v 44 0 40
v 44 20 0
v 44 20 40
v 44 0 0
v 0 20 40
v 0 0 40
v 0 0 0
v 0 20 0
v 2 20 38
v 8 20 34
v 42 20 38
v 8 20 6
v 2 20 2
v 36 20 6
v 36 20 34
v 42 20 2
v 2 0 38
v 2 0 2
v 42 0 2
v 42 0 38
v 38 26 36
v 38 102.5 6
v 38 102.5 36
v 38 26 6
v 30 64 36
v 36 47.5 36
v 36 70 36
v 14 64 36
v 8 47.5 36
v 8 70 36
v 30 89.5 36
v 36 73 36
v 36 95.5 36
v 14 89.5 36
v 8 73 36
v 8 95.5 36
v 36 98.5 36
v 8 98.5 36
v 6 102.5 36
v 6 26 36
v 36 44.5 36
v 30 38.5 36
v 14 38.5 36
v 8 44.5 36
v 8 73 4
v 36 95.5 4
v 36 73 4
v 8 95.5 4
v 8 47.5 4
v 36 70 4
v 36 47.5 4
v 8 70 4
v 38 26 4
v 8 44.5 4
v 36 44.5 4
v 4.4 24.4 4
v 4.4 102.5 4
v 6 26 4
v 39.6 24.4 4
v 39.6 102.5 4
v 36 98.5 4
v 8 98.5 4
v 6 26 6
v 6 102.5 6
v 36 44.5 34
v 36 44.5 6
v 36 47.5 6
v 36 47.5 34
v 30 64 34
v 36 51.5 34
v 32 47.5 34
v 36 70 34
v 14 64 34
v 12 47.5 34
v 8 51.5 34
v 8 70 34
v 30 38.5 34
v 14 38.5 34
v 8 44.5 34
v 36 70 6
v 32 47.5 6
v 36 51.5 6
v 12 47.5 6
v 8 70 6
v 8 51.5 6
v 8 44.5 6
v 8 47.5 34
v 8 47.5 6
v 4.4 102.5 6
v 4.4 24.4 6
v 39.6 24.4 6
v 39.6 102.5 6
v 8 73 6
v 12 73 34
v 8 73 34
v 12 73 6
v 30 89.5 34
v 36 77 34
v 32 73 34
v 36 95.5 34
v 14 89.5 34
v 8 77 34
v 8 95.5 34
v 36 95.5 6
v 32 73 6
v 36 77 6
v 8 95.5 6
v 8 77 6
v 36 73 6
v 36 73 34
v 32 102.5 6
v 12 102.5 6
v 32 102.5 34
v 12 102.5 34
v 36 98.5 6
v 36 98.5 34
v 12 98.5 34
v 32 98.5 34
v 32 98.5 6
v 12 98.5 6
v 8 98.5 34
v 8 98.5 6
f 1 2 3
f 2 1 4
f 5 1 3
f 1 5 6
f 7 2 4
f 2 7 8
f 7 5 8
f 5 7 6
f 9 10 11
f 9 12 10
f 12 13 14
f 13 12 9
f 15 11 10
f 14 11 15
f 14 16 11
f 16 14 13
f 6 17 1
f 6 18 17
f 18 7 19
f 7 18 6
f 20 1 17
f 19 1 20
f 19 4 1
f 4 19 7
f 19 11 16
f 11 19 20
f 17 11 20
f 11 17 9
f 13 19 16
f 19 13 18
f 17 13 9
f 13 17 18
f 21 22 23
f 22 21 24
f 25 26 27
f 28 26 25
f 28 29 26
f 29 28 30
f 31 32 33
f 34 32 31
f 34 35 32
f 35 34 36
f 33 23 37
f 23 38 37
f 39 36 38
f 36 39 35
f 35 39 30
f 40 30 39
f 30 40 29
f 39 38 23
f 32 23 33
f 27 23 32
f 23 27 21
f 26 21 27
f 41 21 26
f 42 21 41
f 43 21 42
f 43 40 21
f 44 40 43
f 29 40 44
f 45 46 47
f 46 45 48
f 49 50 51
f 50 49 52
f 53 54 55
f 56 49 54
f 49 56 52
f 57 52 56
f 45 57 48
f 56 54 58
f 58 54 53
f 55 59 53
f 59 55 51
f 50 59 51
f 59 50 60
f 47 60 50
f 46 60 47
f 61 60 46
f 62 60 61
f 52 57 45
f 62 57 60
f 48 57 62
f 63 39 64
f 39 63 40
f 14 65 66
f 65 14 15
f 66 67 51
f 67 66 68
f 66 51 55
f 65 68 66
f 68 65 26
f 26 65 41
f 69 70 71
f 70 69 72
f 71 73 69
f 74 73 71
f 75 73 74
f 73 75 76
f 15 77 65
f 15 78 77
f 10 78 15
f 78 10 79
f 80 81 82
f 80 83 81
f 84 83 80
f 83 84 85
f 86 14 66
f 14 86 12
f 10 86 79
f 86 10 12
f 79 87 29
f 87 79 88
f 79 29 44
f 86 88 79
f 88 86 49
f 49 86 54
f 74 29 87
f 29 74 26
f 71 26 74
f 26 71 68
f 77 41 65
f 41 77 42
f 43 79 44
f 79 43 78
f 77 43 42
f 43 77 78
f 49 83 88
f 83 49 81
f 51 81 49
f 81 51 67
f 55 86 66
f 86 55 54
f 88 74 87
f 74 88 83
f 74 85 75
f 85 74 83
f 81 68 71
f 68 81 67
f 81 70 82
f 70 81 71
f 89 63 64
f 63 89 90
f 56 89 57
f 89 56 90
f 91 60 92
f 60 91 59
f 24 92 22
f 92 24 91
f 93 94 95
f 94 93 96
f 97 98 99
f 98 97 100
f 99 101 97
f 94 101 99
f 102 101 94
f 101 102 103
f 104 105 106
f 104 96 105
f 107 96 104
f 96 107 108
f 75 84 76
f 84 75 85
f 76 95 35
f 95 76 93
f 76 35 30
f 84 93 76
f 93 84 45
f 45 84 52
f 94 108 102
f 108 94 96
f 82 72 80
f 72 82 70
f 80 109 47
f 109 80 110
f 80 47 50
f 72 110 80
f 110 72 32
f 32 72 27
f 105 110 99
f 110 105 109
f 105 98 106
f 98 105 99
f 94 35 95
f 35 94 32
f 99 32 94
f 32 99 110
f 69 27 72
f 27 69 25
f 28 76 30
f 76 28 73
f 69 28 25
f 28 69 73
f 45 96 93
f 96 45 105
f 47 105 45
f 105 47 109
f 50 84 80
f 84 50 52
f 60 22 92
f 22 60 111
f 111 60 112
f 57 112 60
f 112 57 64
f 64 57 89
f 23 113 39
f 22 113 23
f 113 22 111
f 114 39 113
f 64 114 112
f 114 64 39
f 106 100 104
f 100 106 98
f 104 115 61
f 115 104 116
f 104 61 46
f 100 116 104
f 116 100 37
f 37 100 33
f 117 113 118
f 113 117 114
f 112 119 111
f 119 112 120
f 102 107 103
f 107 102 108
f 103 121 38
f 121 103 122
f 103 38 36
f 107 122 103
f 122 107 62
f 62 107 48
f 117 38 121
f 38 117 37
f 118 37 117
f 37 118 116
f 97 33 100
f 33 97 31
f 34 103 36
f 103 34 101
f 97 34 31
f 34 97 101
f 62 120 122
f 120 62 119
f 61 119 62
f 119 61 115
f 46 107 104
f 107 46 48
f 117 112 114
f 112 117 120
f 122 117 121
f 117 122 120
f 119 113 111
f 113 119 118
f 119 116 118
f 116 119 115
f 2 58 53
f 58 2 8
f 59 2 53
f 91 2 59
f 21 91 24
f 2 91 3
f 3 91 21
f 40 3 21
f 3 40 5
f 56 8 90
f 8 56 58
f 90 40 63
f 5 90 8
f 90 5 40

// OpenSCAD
 //Variables
// Select which part you want to create: corpus is the main part of the pollenstripper, corpus_brush is a version of the pollenstripper with angled mounts for brushes, the darkener is a part that sits on top of the plexiglas cube to keep light from getting in and the funnel was meant to collect the pollen after it fell off and through the grid (deprecated)
cube_design = "corpus"; // [corpus, corpus_dual_cube, corpus_brush, darkener, funnel]

/* [Acrylic Cube] */
plexi_cube_width = 39; //39 for cube1, 32 for cube2
plexi_cube_length = 35; //35 for cube1, 30 for cube2
plexi_cube_depth_overall = 30;
plexi_cube_depth = 20; //this is for the main corpus
plexi_cube_thickness = 2;
plexi_cube_buffer = 0.5; //1mm room in every direction

/* [Acrylic Cube 2: Only necessary for dual cube corpus] */
plexi_cube_width2 = 39; //39 for cube1, 32 for cube2
plexi_cube_length2 = 35; //35 for cube1, 30 for cube2
plexi_cube_depth_overall2 = 30;
plexi_cube_depth2 = 20; //this is for the main corpus
plexi_cube_thickness2 = 2;
plexi_cube_buffer2 = 0.5; //1mm room in every direction

/* [Darkener] */
// The length that the darkener overlaps with the corpus
darkener_overhang = 10;

/* [Insert] */
//needs to be the same as in the insert creator
insert_bar_height = 6;
//needs to be the same as in the insert creator
insert_bar_length = 16;
//needs to be the same as "base plate length upper" in the insert creator
insert_base_length = 28;
//needs to be the same as "base plate thickness" in the insert creator
insert_thickness = 2;
// buffer space between corpus and insert
insert_buffer = 1;
// distance of the insert from the end of the tube. CAREFUL: changing this can break the design, default=4
insert_distance_from_tube_end = 4;

/* [Corpus Basics] */
//thickness of the tubes (lower parts of the corpus containing the inserts)
tube_thickness = 2;
//width of the tubes
tube_width = 28;
//length of the tubes
tube_length = 28;
//depth of the tubes, 25.5 for normal corpus design, 32 for brush
tube_depth = 25.5; // was 38.5, for normal design 25.5, increase for brush to 32
//number of tubes
tube_count = 3;

// width of the bar that locks the inserts so that they can't move to the back, CAREFUL: changing this will break the design, default = 4
security_bar_width = 4;
slide_bar_length = tube_depth+2;
// width of the bar the funnel slides on
slide_bar_width = 1.6; //decreased from 2 to 1,6 for buffer
//height of the bar the funnel slides on
slide_bar_height = 2;

/* [Grid Pattern] */
// grid pattern, meant to let the stripped pollen fall through into the funnel
grid_pattern = "None"; //[None, squares, squares2]
//width of the squares
square_width = 5;
//length of the squares
square_length = 4;
//distance between the squares
square_distance = 2;
//number oif squares per row
number_squares_per_row = 4;
//number of squares per column, suggestion for normal corpus 2, for brush 3
number_squares_per_column = 3;

/* [Brush] */
// length of the top part of the brush
brush_head_length = 16;
// length of the bottom part of the brush
brush_bottom_length = 24;
// width of the brush
brush_width = 19.25;
// thickness of the brush
brush_thickness = 5.5;
// distance of the screw holes from the top of the brush
distance_hole_from_top = 1.6;
// distance of the screw holes from the side of the brush
distance_hole_from_side = 2.6;
// diameter of the screw holes
diameter = 3;

/* [Funnel] */
// width of the bars that slide on the corpus
funnel_slide_width = 4;
// height of the bars that slide on the corpus
funnel_slide_height = 7;
// height of the hollow part of the bars that slide on the corpus
funnel_slide_hollow_height = 3;
// buffer between the corpus bar and the funnel slide bar
funnel_slide_buffer_width = 0.2;
// length of the pyramid
funnel_pyramid_length = 32;
// height of the tip of the pyramid part
funnel_pyramid_tip_height = 18;
// width of the cube at the top of the funnel
funnel_tip_cube_width = 14;
// length of the cube at the top of the funnel
funnel_tip_cube_length = 14;
// height of the cube at the top of the funnel
funnel_tip_cube_height = 11;
// height of the cylinder that hollows out the top of the funnel
funnel_hollow_cylinder_height = 20;
// diameter of the cylinder that hollows out the top of the funnel
funnel_hollow_cylinder_diameter = 7;



/* [Misc] */
// Number of Faces: higher number is good for smoother curved areas, lower number significantly decreases rendering time, recommending 25 for playing around and 100 for exporting
$fn = 50;

//angle
tube_distance_left = (plexi_cube_width/2+plexi_cube_buffer+plexi_cube_thickness-tube_width/2-tube_thickness);
tube_distance_bottom = (plexi_cube_length/2+plexi_cube_buffer+plexi_cube_thickness-tube_length/2-tube_thickness);
angle_depth = max(tube_distance_left, tube_distance_bottom);
outer_cube_width = plexi_cube_width + 2*plexi_cube_thickness + 2*plexi_cube_buffer;
outer_cube_length = plexi_cube_length + 2*plexi_cube_thickness + 2*plexi_cube_buffer;

//angle2
tube_distance_left2 = (plexi_cube_width2/2+plexi_cube_buffer2+plexi_cube_thickness2-tube_width/2-tube_thickness);
tube_distance_bottom2 = (plexi_cube_length2/2+plexi_cube_buffer2+plexi_cube_thickness2-tube_length/2-tube_thickness);
angle_depth2 = max(tube_distance_left2, tube_distance_bottom2);
outer_cube_width2 = plexi_cube_width2 + 2*plexi_cube_thickness2 + 2*plexi_cube_buffer2;
outer_cube_length2 = plexi_cube_length2 + 2*plexi_cube_thickness2 + 2*plexi_cube_buffer2;

//module to create triangles
module triangle(width,length,height){
    difference(){
        cube([width,length,height]);
        rotate([0,0,45]) cube([width*2.5,length*2.5,height*5]);
    }
}

//module to show points of a polyhedron
module showPoints(v) {
    for (i = [0: len(v)-1]) {
        translate(v[i]) color("red") 
        text(str(i), font = "Courier New", size=1.5);
         
    }
}

//module to create a square grid pattern
module square_grid(){
    grid_width = square_width*number_squares_per_row + square_distance*(number_squares_per_row-1);
    grid_length = square_length*number_squares_per_column + square_distance*(number_squares_per_column-1);
translate([tube_width/2+tube_thickness-grid_width/2,tube_depth+angle_depth-(insert_distance_from_tube_end+insert_thickness+insert_buffer+insert_bar_height)+3,0])
translate([grid_width,0,0])
rotate([0,0,180])
for (j=[0:number_squares_per_column-1]){
for (i=[0:number_squares_per_row-1]){
    translate([i*(square_distance+square_width),j*(square_distance+square_length),0])cube([square_width,square_length,tube_thickness]);
    }
}
}

module square_grid2(){
    grid_width = square_width*number_squares_per_row + square_distance*(number_squares_per_row-1);
    grid_length = square_length*number_squares_per_column + square_distance*(number_squares_per_column-1);
translate([tube_width/2+tube_thickness-grid_width/2,tube_depth+angle_depth-(insert_distance_from_tube_end+insert_thickness+insert_buffer+insert_bar_height),0])
translate([grid_width-square_length/2,0,0])
rotate([0,0,180])
for (j=[0:number_squares_per_column-1]){
for (i=[0:number_squares_per_row-1]){
    translate([i*(square_distance+square_width),j*(square_distance+square_length),0])rotate([0,0,45])cube([square_width,square_length,tube_thickness]);
    }
}
}

//module to create a brush as a standin
module brush (){
difference(){
union(){
color("green")cube([brush_width, brush_thickness, brush_head_length]);
color("brown")translate([0,0,brush_head_length])cube([brush_width, brush_thickness, brush_bottom_length]);
}

union(){
translate([diameter/2+distance_hole_from_side,0,diameter/2 + distance_hole_from_top])rotate([270,0,0])cylinder(h=brush_thickness, d=diameter);
translate([brush_width-diameter/2-distance_hole_from_side,0,diameter/2 + distance_hole_from_top])rotate([270,0,0])cylinder(h=brush_thickness, d=diameter);
}
}
}

//module to create a mount for the brush
module brush_mount (){
difference(){
union(){
color("green")cube([brush_width, brush_thickness, brush_head_length]);
color("brown")translate([0,0,brush_head_length])cube([brush_width, brush_thickness, brush_bottom_length]);
}

union(){
translate([diameter/2+distance_hole_from_side,0,diameter/2 + distance_hole_from_top])rotate([270,0,0])cylinder(h=brush_thickness, d=diameter);
translate([brush_width-diameter/2-distance_hole_from_side,0,diameter/2 + distance_hole_from_top])rotate([270,0,0])cylinder(h=brush_thickness, d=diameter);
}
}
}


if (cube_design == "corpus"){
union(){

//plexi_cube part of the tube
difference(){
    cube([plexi_cube_width + 2*plexi_cube_thickness + 2*plexi_cube_buffer, plexi_cube_depth, plexi_cube_length+2*plexi_cube_thickness + 2*plexi_cube_buffer]);
    translate([plexi_cube_thickness,0,plexi_cube_thickness])cube([plexi_cube_width + 2*plexi_cube_buffer, plexi_cube_depth, plexi_cube_length + 2*plexi_cube_buffer]);
}

//angle
angle_points = [
    [0,0,0], //0
    [outer_cube_width,0,0],//1
    [outer_cube_width,0,outer_cube_length],//2
    [0,0,outer_cube_length],//3
    [tube_distance_left,0,tube_distance_bottom],//4
    [outer_cube_width-tube_distance_left,0,tube_distance_bottom],//5
    [outer_cube_width-tube_distance_left,0,outer_cube_length-tube_distance_bottom],//6
    [tube_distance_left,0,outer_cube_length-tube_distance_bottom],//7
    [tube_distance_left,angle_depth,tube_distance_bottom],//8
    [outer_cube_width-tube_distance_left,angle_depth,tube_distance_bottom],//9
    [outer_cube_width-tube_distance_left,angle_depth,outer_cube_length-tube_distance_bottom],//10
    [tube_distance_left,angle_depth,outer_cube_length-tube_distance_bottom],//11
    
];

*showPoints(angle_points);
angle_faces = [
    [1,0,4,5],
    [0,1,9,8],
    [5,4,8,9],
    [2,1,5,6],
    [1,2,10,9],
    [6,5,9,10],
    [3,2,6,7],
    [2,3,11,10],
    [7,6,10,11],
    [0,3,7,4],
    [3,0,8,11],
    [4,7,11,8],
];


translate([0,plexi_cube_depth,0])
polyhedron(angle_points, angle_faces);



//tube
translate([plexi_cube_width/2-tube_width/2 + plexi_cube_buffer,plexi_cube_depth ,plexi_cube_length/2-tube_length/2 + plexi_cube_buffer]) 
for(i=[0:tube_count-1]){
if (i==0){
translate([0,tube_depth*i,0])    
union(){
difference(){
    cube([tube_width+2*tube_thickness, tube_depth + angle_depth, tube_length + 2*tube_thickness]);
    translate([tube_thickness,0,tube_thickness])cube([tube_width, tube_depth + angle_depth, tube_length]);
    

insert_slot_upper_points = [
    [0,0,0], //0
    [insert_base_length,0,0],//1
    [insert_base_length,insert_thickness + insert_buffer, 0],//2
    [insert_base_length/2 + insert_bar_length/2,insert_thickness + insert_buffer + insert_bar_height,0],//3
    [insert_base_length/2 - insert_bar_length/2,insert_thickness + insert_buffer + insert_bar_height,0],//4
    [0,insert_thickness + insert_buffer, 0],//5
    [0,0,tube_thickness], //6
    [insert_base_length,0,tube_thickness],//7
    [insert_base_length,insert_thickness + insert_buffer, tube_thickness],//8
    [insert_base_length/2 + insert_bar_length/2,insert_thickness + insert_buffer + insert_bar_height,tube_thickness],//9
    [insert_base_length/2 - insert_bar_length/2,insert_thickness + insert_buffer + insert_bar_height,tube_thickness],//10
    [0,insert_thickness + insert_buffer, tube_thickness],//11
];

*showPoints(insert_slot_upper_points);

insert_slot_upper_faces = [
    [0,1,2,3,4,5],
    [0,5,11,6],
    [5,4,10,11],
    [4,3,9,10],
    [3,2,8,9],
    [2,1,7,8],
    [1,0,6,7],
    [11,10,9,8,7,6]
];

translate([tube_width/2+tube_thickness-insert_base_length/2,tube_depth+angle_depth-(insert_bar_height+insert_thickness+insert_buffer)-insert_distance_from_tube_end,tube_length+tube_thickness])translate([insert_base_length,insert_bar_height + insert_thickness + insert_buffer,0])rotate([0,0,180])polyhedron(insert_slot_upper_points,insert_slot_upper_faces);

translate([tube_width/2+tube_thickness-insert_base_length/2,tube_depth+angle_depth-(insert_thickness+insert_buffer)-insert_distance_from_tube_end,0])cube([insert_base_length,insert_thickness+insert_buffer,tube_thickness]);


if (grid_pattern == "squares") square_grid();
else if (grid_pattern == "squares2") square_grid2();   
    
}

//security_bar
translate([tube_thickness,tube_depth+angle_depth-insert_distance_from_tube_end,tube_thickness])translate([0,insert_distance_from_tube_end,0])rotate([0,0,270])triangle(insert_distance_from_tube_end,security_bar_width,tube_length);
translate([tube_width-tube_thickness,tube_depth+angle_depth-insert_distance_from_tube_end,tube_thickness])triangle(insert_distance_from_tube_end,security_bar_width,tube_length);

//slide bar
translate([-slide_bar_width,tube_depth+angle_depth-slide_bar_length,0])
color("red"){cube([slide_bar_width,slide_bar_length,slide_bar_height]); 
}
translate([tube_width+2*tube_thickness,tube_depth+angle_depth-slide_bar_length,0])
color("red"){cube([slide_bar_width,slide_bar_length,slide_bar_height]); 
}

}
}
else if (i<tube_count-1){
translate([0,tube_depth*i,0])    
union(){
difference(){
    translate([0,angle_depth,0])
    cube([tube_width+2*tube_thickness, tube_depth , tube_length + 2*tube_thickness]);
    translate([tube_thickness,0,tube_thickness])cube([tube_width, tube_depth + angle_depth, tube_length]);
    

insert_slot_upper_points = [
    [0,0,0], //0
    [insert_base_length,0,0],//1
    [insert_base_length,insert_thickness + insert_buffer, 0],//2
    [insert_base_length/2 + insert_bar_length/2,insert_thickness + insert_buffer + insert_bar_height,0],//3
    [insert_base_length/2 - insert_bar_length/2,insert_thickness + insert_buffer + insert_bar_height,0],//4
    [0,insert_thickness + insert_buffer, 0],//5
    [0,0,tube_thickness], //6
    [insert_base_length,0,tube_thickness],//7
    [insert_base_length,insert_thickness + insert_buffer, tube_thickness],//8
    [insert_base_length/2 + insert_bar_length/2,insert_thickness + insert_buffer + insert_bar_height,tube_thickness],//9
    [insert_base_length/2 - insert_bar_length/2,insert_thickness + insert_buffer + insert_bar_height,tube_thickness],//10
    [0,insert_thickness + insert_buffer, tube_thickness],//11
];

*showPoints(insert_slot_upper_points);

insert_slot_upper_faces = [
    [0,1,2,3,4,5],
    [0,5,11,6],
    [5,4,10,11],
    [4,3,9,10],
    [3,2,8,9],
    [2,1,7,8],
    [1,0,6,7],
    [11,10,9,8,7,6]
];

translate([tube_width/2+tube_thickness-insert_base_length/2,tube_depth+angle_depth-(insert_bar_height+insert_thickness+insert_buffer)-insert_distance_from_tube_end,tube_length+tube_thickness])translate([insert_base_length,insert_bar_height + insert_thickness + insert_buffer,0])rotate([0,0,180])polyhedron(insert_slot_upper_points,insert_slot_upper_faces);

translate([tube_width/2+tube_thickness-insert_base_length/2,tube_depth+angle_depth-(insert_thickness+insert_buffer)-insert_distance_from_tube_end,0])cube([insert_base_length,insert_thickness+insert_buffer,tube_thickness]);


if (grid_pattern == "squares") square_grid();
else if (grid_pattern == "squares2") square_grid2();   
    
}

//security_bar
translate([tube_thickness,tube_depth+angle_depth-insert_distance_from_tube_end,tube_thickness])translate([0,insert_distance_from_tube_end,0])rotate([0,0,270])triangle(insert_distance_from_tube_end,security_bar_width,tube_length);
translate([tube_width-tube_thickness,tube_depth+angle_depth-insert_distance_from_tube_end,tube_thickness])triangle(insert_distance_from_tube_end,security_bar_width,tube_length);

//slide bar
translate([-slide_bar_width,tube_depth+angle_depth-slide_bar_length,0])
color("red"){cube([slide_bar_width,slide_bar_length,slide_bar_height]); 
}
translate([tube_width+2*tube_thickness,tube_depth+angle_depth-slide_bar_length,0])
color("red"){cube([slide_bar_width,slide_bar_length,slide_bar_height]); 
}

}
}
else if (i==tube_count-1){
translate([0,tube_depth*i,0])    
union(){
difference(){
    translate([0,angle_depth,0])
    cube([tube_width+2*tube_thickness, tube_depth , tube_length + 2*tube_thickness]);
    translate([tube_thickness,0,tube_thickness])cube([tube_width, tube_depth + angle_depth, tube_length]);
    
//insert_slot
insert_slot_upper_points = [
    [0,0,0], //0
    [insert_base_length,0,0],//1
    [insert_base_length,insert_thickness + insert_buffer, 0],//2
    [insert_base_length/2 + insert_bar_length/2,insert_thickness + insert_buffer + insert_bar_height,0],//3
    [insert_base_length/2 - insert_bar_length/2,insert_thickness + insert_buffer + insert_bar_height,0],//4
    [0,insert_thickness + insert_buffer, 0],//5
    [0,0,tube_thickness], //6
    [insert_base_length,0,tube_thickness],//7
    [insert_base_length,insert_thickness + insert_buffer, tube_thickness],//8
    [insert_base_length/2 + insert_bar_length/2,insert_thickness + insert_buffer + insert_bar_height,tube_thickness],//9
    [insert_base_length/2 - insert_bar_length/2,insert_thickness + insert_buffer + insert_bar_height,tube_thickness],//10
    [0,insert_thickness + insert_buffer, tube_thickness],//11
];

*showPoints(insert_slot_upper_points);

insert_slot_upper_faces = [
    [0,1,2,3,4,5],
    [0,5,11,6],
    [5,4,10,11],
    [4,3,9,10],
    [3,2,8,9],
    [2,1,7,8],
    [1,0,6,7],
    [11,10,9,8,7,6]
];

translate([tube_width/2+tube_thickness-insert_base_length/2,tube_depth+angle_depth-(insert_bar_height+insert_thickness+insert_buffer)-insert_distance_from_tube_end,tube_length+tube_thickness])translate([insert_base_length,insert_bar_height + insert_thickness + insert_buffer,0])rotate([0,0,180])polyhedron(insert_slot_upper_points,insert_slot_upper_faces);

translate([tube_width/2+tube_thickness-insert_base_length/2,tube_depth+angle_depth-(insert_thickness+insert_buffer)-insert_distance_from_tube_end,0])cube([insert_base_length,insert_thickness+insert_buffer,tube_thickness]);


if (grid_pattern == "squares") square_grid();
else if (grid_pattern == "squares2") square_grid2();   
    
}
//security_bar
translate([tube_thickness,tube_depth+angle_depth-insert_distance_from_tube_end,tube_thickness])cube([security_bar_width,insert_distance_from_tube_end,tube_length]);
translate([tube_width-tube_thickness,tube_depth+angle_depth-insert_distance_from_tube_end,tube_thickness])cube([security_bar_width,insert_distance_from_tube_end,tube_length]);
//slide_bar
translate([-slide_bar_width,tube_depth+angle_depth-slide_bar_length,0])
color("red"){cube([slide_bar_width,slide_bar_length,slide_bar_height]); 
}
translate([tube_width+2*tube_thickness,tube_depth+angle_depth-slide_bar_length,0])
color("red"){cube([slide_bar_width,slide_bar_length,slide_bar_height]); 

}
}
}
}
}
}
// -----------------------------------------

if (cube_design == "corpus_dual_cube"){
union(){

//plexi_cube part of the tube
    
difference(){
    cube([plexi_cube_width + 2*plexi_cube_thickness + 2*plexi_cube_buffer, plexi_cube_depth, plexi_cube_length+2*plexi_cube_thickness + 2*plexi_cube_buffer]);
    translate([plexi_cube_thickness,0,plexi_cube_thickness])cube([plexi_cube_width + 2*plexi_cube_buffer, plexi_cube_depth, plexi_cube_length + 2*plexi_cube_buffer]);
}

//angle
angle_points = [
    [0,0,0], //0
    [outer_cube_width,0,0],//1
    [outer_cube_width,0,outer_cube_length],//2
    [0,0,outer_cube_length],//3
    [tube_distance_left,0,tube_distance_bottom],//4
    [outer_cube_width-tube_distance_left,0,tube_distance_bottom],//5
    [outer_cube_width-tube_distance_left,0,outer_cube_length-tube_distance_bottom],//6
    [tube_distance_left,0,outer_cube_length-tube_distance_bottom],//7
    [tube_distance_left,angle_depth,tube_distance_bottom],//8
    [outer_cube_width-tube_distance_left,angle_depth,tube_distance_bottom],//9
    [outer_cube_width-tube_distance_left,angle_depth,outer_cube_length-tube_distance_bottom],//10
    [tube_distance_left,angle_depth,outer_cube_length-tube_distance_bottom],//11
    
];

*showPoints(angle_points);
angle_faces = [
    [1,0,4,5],
    [0,1,9,8],
    [5,4,8,9],
    [2,1,5,6],
    [1,2,10,9],
    [6,5,9,10],
    [3,2,6,7],
    [2,3,11,10],
    [7,6,10,11],
    [0,3,7,4],
    [3,0,8,11],
    [4,7,11,8],
];


translate([0,plexi_cube_depth,0])
polyhedron(angle_points, angle_faces);

translate([((plexi_cube_width-tube_width)/2)-((plexi_cube_width2-tube_width)/2),angle_depth+plexi_cube_depth2 + tube_count*tube_depth-1 ,((plexi_cube_length-tube_length)/2)-((plexi_cube_length2-tube_length)/2)])union(){

//plexi_cube2 part of the tube
    
translate([0,angle_depth2,0])difference(){
    cube([plexi_cube_width2 + 2*plexi_cube_thickness2 + 2*plexi_cube_buffer2, plexi_cube_depth2, plexi_cube_length2+2*plexi_cube_thickness2 + 2*plexi_cube_buffer2]);
    translate([plexi_cube_thickness2,0,plexi_cube_thickness2])cube([plexi_cube_width2 + 2*plexi_cube_buffer2, plexi_cube_depth2, plexi_cube_length2 + 2*plexi_cube_buffer2]);
}

//angle2
angle_points = [
    [0,angle_depth2,0], //0
    [outer_cube_width2,angle_depth2,0],//1
    [outer_cube_width2,angle_depth2,outer_cube_length2],//2
    [0,angle_depth2,outer_cube_length2],//3
    [tube_distance_left2,0,tube_distance_bottom2],//4
    [outer_cube_width2-tube_distance_left2,0,tube_distance_bottom2],//5
    [outer_cube_width2-tube_distance_left2,0,outer_cube_length2-tube_distance_bottom2],//6
    [tube_distance_left2,0,outer_cube_length2-tube_distance_bottom2],//7
    [tube_distance_left2,angle_depth2,tube_distance_bottom2],//8
    [outer_cube_width2-tube_distance_left2,angle_depth2,tube_distance_bottom2],//9
    [outer_cube_width2-tube_distance_left2,angle_depth2,outer_cube_length2-tube_distance_bottom2],//10
    [tube_distance_left2,angle_depth2,outer_cube_length2-tube_distance_bottom2],//11
    
];

*showPoints(angle_points);
angle_faces = [
    [1,0,4,5],
    [0,1,9,8],
    [5,4,8,9],
    [2,1,5,6],
    [1,2,10,9],
    [6,5,9,10],
    [3,2,6,7],
    [2,3,11,10],
    [7,6,10,11],
    [0,3,7,4],
    [3,0,8,11],
    [4,7,11,8],
];



polyhedron(angle_points, angle_faces);
}

//tube
translate([plexi_cube_width/2-tube_width/2 + plexi_cube_buffer,plexi_cube_depth ,plexi_cube_length/2-tube_length/2 + plexi_cube_buffer]) 
for(i=[0:tube_count-1]){
if (i==0){
translate([0,tube_depth*i,0])    
union(){
difference(){
    cube([tube_width+2*tube_thickness, tube_depth + angle_depth, tube_length + 2*tube_thickness]);
    translate([tube_thickness,0,tube_thickness])cube([tube_width, tube_depth + angle_depth, tube_length]);
    

insert_slot_upper_points = [
    [0,0,0], //0
    [insert_base_length,0,0],//1
    [insert_base_length,insert_thickness + insert_buffer, 0],//2
    [insert_base_length/2 + insert_bar_length/2,insert_thickness + insert_buffer + insert_bar_height,0],//3
    [insert_base_length/2 - insert_bar_length/2,insert_thickness + insert_buffer + insert_bar_height,0],//4
    [0,insert_thickness + insert_buffer, 0],//5
    [0,0,tube_thickness], //6
    [insert_base_length,0,tube_thickness],//7
    [insert_base_length,insert_thickness + insert_buffer, tube_thickness],//8
    [insert_base_length/2 + insert_bar_length/2,insert_thickness + insert_buffer + insert_bar_height,tube_thickness],//9
    [insert_base_length/2 - insert_bar_length/2,insert_thickness + insert_buffer + insert_bar_height,tube_thickness],//10
    [0,insert_thickness + insert_buffer, tube_thickness],//11
];

*showPoints(insert_slot_upper_points);

insert_slot_upper_faces = [
    [0,1,2,3,4,5],
    [0,5,11,6],
    [5,4,10,11],
    [4,3,9,10],
    [3,2,8,9],
    [2,1,7,8],
    [1,0,6,7],
    [11,10,9,8,7,6]
];

translate([tube_width/2+tube_thickness-insert_base_length/2,tube_depth+angle_depth-(insert_bar_height+insert_thickness+insert_buffer)-insert_distance_from_tube_end,tube_length+tube_thickness])translate([insert_base_length,insert_bar_height + insert_thickness + insert_buffer,0])rotate([0,0,180])polyhedron(insert_slot_upper_points,insert_slot_upper_faces);

translate([tube_width/2+tube_thickness-insert_base_length/2,tube_depth+angle_depth-(insert_thickness+insert_buffer)-insert_distance_from_tube_end,0])cube([insert_base_length,insert_thickness+insert_buffer,tube_thickness]);


if (grid_pattern == "squares") square_grid();
else if (grid_pattern == "squares2") square_grid2();   
    
}

//security_bar
translate([tube_thickness,tube_depth+angle_depth-insert_distance_from_tube_end,tube_thickness])translate([0,insert_distance_from_tube_end,0])rotate([0,0,270])triangle(insert_distance_from_tube_end,security_bar_width,tube_length);
translate([tube_width-tube_thickness,tube_depth+angle_depth-insert_distance_from_tube_end,tube_thickness])triangle(insert_distance_from_tube_end,security_bar_width,tube_length);



}
}
else if (i<tube_count-1){
translate([0,tube_depth*i,0])    
union(){
difference(){
    translate([0,angle_depth,0])
    cube([tube_width+2*tube_thickness, tube_depth , tube_length + 2*tube_thickness]);
    translate([tube_thickness,0,tube_thickness])cube([tube_width, tube_depth + angle_depth, tube_length]);
    

insert_slot_upper_points = [
    [0,0,0], //0
    [insert_base_length,0,0],//1
    [insert_base_length,insert_thickness + insert_buffer, 0],//2
    [insert_base_length/2 + insert_bar_length/2,insert_thickness + insert_buffer + insert_bar_height,0],//3
    [insert_base_length/2 - insert_bar_length/2,insert_thickness + insert_buffer + insert_bar_height,0],//4
    [0,insert_thickness + insert_buffer, 0],//5
    [0,0,tube_thickness], //6
    [insert_base_length,0,tube_thickness],//7
    [insert_base_length,insert_thickness + insert_buffer, tube_thickness],//8
    [insert_base_length/2 + insert_bar_length/2,insert_thickness + insert_buffer + insert_bar_height,tube_thickness],//9
    [insert_base_length/2 - insert_bar_length/2,insert_thickness + insert_buffer + insert_bar_height,tube_thickness],//10
    [0,insert_thickness + insert_buffer, tube_thickness],//11
];

*showPoints(insert_slot_upper_points);

insert_slot_upper_faces = [
    [0,1,2,3,4,5],
    [0,5,11,6],
    [5,4,10,11],
    [4,3,9,10],
    [3,2,8,9],
    [2,1,7,8],
    [1,0,6,7],
    [11,10,9,8,7,6]
];

translate([tube_width/2+tube_thickness-insert_base_length/2,tube_depth+angle_depth-(insert_bar_height+insert_thickness+insert_buffer)-insert_distance_from_tube_end,tube_length+tube_thickness])translate([insert_base_length,insert_bar_height + insert_thickness + insert_buffer,0])rotate([0,0,180])polyhedron(insert_slot_upper_points,insert_slot_upper_faces);

translate([tube_width/2+tube_thickness-insert_base_length/2,tube_depth+angle_depth-(insert_thickness+insert_buffer)-insert_distance_from_tube_end,0])cube([insert_base_length,insert_thickness+insert_buffer,tube_thickness]);


if (grid_pattern == "squares") square_grid();
else if (grid_pattern == "squares2") square_grid2();   
    
}

//security_bar
translate([tube_thickness,tube_depth+angle_depth-insert_distance_from_tube_end,tube_thickness])translate([0,insert_distance_from_tube_end,0])rotate([0,0,270])triangle(insert_distance_from_tube_end,security_bar_width,tube_length);
translate([tube_width-tube_thickness,tube_depth+angle_depth-insert_distance_from_tube_end,tube_thickness])triangle(insert_distance_from_tube_end,security_bar_width,tube_length);

}
}
else if (i==tube_count-1){
translate([0,tube_depth*i,0])    
union(){
difference(){
    translate([0,angle_depth,0])
    cube([tube_width+2*tube_thickness, tube_depth , tube_length + 2*tube_thickness]);
    translate([tube_thickness,0,tube_thickness])cube([tube_width, tube_depth + angle_depth, tube_length]);
    
//insert_slot
insert_slot_upper_points = [
    [0,0,0], //0
    [insert_base_length,0,0],//1
    [insert_base_length,insert_thickness + insert_buffer, 0],//2
    [insert_base_length/2 + insert_bar_length/2,insert_thickness + insert_buffer + insert_bar_height,0],//3
    [insert_base_length/2 - insert_bar_length/2,insert_thickness + insert_buffer + insert_bar_height,0],//4
    [0,insert_thickness + insert_buffer, 0],//5
    [0,0,tube_thickness], //6
    [insert_base_length,0,tube_thickness],//7
    [insert_base_length,insert_thickness + insert_buffer, tube_thickness],//8
    [insert_base_length/2 + insert_bar_length/2,insert_thickness + insert_buffer + insert_bar_height,tube_thickness],//9
    [insert_base_length/2 - insert_bar_length/2,insert_thickness + insert_buffer + insert_bar_height,tube_thickness],//10
    [0,insert_thickness + insert_buffer, tube_thickness],//11
];

*showPoints(insert_slot_upper_points);

insert_slot_upper_faces = [
    [0,1,2,3,4,5],
    [0,5,11,6],
    [5,4,10,11],
    [4,3,9,10],
    [3,2,8,9],
    [2,1,7,8],
    [1,0,6,7],
    [11,10,9,8,7,6]
];

translate([tube_width/2+tube_thickness-insert_base_length/2,tube_depth+angle_depth-(insert_bar_height+insert_thickness+insert_buffer)-insert_distance_from_tube_end,tube_length+tube_thickness])translate([insert_base_length,insert_bar_height + insert_thickness + insert_buffer,0])rotate([0,0,180])polyhedron(insert_slot_upper_points,insert_slot_upper_faces);

translate([tube_width/2+tube_thickness-insert_base_length/2,tube_depth+angle_depth-(insert_thickness+insert_buffer)-insert_distance_from_tube_end,0])cube([insert_base_length,insert_thickness+insert_buffer,tube_thickness]);


if (grid_pattern == "squares") square_grid();
else if (grid_pattern == "squares2") square_grid2();   
    
}
//security_bar
translate([tube_thickness,tube_depth+angle_depth-insert_distance_from_tube_end,tube_thickness])cube([security_bar_width,insert_distance_from_tube_end,tube_length]);
translate([tube_width-tube_thickness,tube_depth+angle_depth-insert_distance_from_tube_end,tube_thickness])cube([security_bar_width,insert_distance_from_tube_end,tube_length]);

}
}
}
}
}
// -----------------------------------------


if (cube_design == "corpus_brush"){
union(){

//plexi_cube part of the tube
difference(){
    cube([plexi_cube_width + 2*plexi_cube_thickness + 2*plexi_cube_buffer, plexi_cube_depth, plexi_cube_length+2*plexi_cube_thickness + 2*plexi_cube_buffer]);
    translate([plexi_cube_thickness,0,plexi_cube_thickness])cube([plexi_cube_width + 2*plexi_cube_buffer, plexi_cube_depth, plexi_cube_length + 2*plexi_cube_buffer]);
}

//angle
angle_points = [
    [0,0,0], //0
    [outer_cube_width,0,0],//1
    [outer_cube_width,0,outer_cube_length],//2
    [0,0,outer_cube_length],//3
    [tube_distance_left,0,tube_distance_bottom],//4
    [outer_cube_width-tube_distance_left,0,tube_distance_bottom],//5
    [outer_cube_width-tube_distance_left,0,outer_cube_length-tube_distance_bottom],//6
    [tube_distance_left,0,outer_cube_length-tube_distance_bottom],//7
    [tube_distance_left,angle_depth,tube_distance_bottom],//8
    [outer_cube_width-tube_distance_left,angle_depth,tube_distance_bottom],//9
    [outer_cube_width-tube_distance_left,angle_depth,outer_cube_length-tube_distance_bottom],//10
    [tube_distance_left,angle_depth,outer_cube_length-tube_distance_bottom],//11
    
];

*showPoints(angle_points);
angle_faces = [
    [1,0,4,5],
    [0,1,9,8],
    [5,4,8,9],
    [2,1,5,6],
    [1,2,10,9],
    [6,5,9,10],
    [3,2,6,7],
    [2,3,11,10],
    [7,6,10,11],
    [0,3,7,4],
    [3,0,8,11],
    [4,7,11,8],
];


translate([0,plexi_cube_depth,0])
polyhedron(angle_points, angle_faces);



//tube
translate([plexi_cube_width/2-tube_width/2 + plexi_cube_buffer,plexi_cube_depth ,plexi_cube_length/2-tube_length/2 + plexi_cube_buffer]) 

union(){
difference(){
    union(){
    cube([tube_width+2*tube_thickness, tube_depth + angle_depth, tube_length + 2*tube_thickness]);
        
    //Brush mounts
translate([-(plexi_cube_width/2-tube_width/2 + plexi_cube_buffer),-(plexi_cube_depth) ,-(plexi_cube_length/2-tube_length/2 + plexi_cube_buffer)]) translate([0,plexi_cube_width+tube_depth/2,((plexi_cube_length+2*plexi_cube_thickness+2*plexi_cube_buffer)-brush_width)/2])translate([-brush_head_length,0,brush_width])rotate([30,90,0])translate([0,brush_thickness,0])brush_mount();

translate([-(plexi_cube_width/2-tube_width/2 + plexi_cube_buffer),-(plexi_cube_depth) ,-(plexi_cube_length/2-tube_length/2 + plexi_cube_buffer)])translate([0,plexi_cube_width+tube_depth/2,((plexi_cube_length+2*plexi_cube_thickness+2*plexi_cube_buffer)-brush_width)/2])translate([+brush_head_length,0,brush_width])translate([plexi_cube_width+2*plexi_cube_thickness + 2*plexi_cube_buffer,0,-brush_width])rotate([0,180,0])rotate([30,90,0])translate([0,brush_thickness,0])brush_mount();
    }
    insert_slot_upper_points = [
    [0,0,0], //0
    [insert_base_length,0,0],//1
    [insert_base_length,insert_thickness + insert_buffer, 0],//2
    [insert_base_length/2 + insert_bar_length/2,insert_thickness + insert_buffer + insert_bar_height,0],//3
    [insert_base_length/2 - insert_bar_length/2,insert_thickness + insert_buffer + insert_bar_height,0],//4
    [0,insert_thickness + insert_buffer, 0],//5
    [0,0,tube_thickness], //6
    [insert_base_length,0,tube_thickness],//7
    [insert_base_length,insert_thickness + insert_buffer, tube_thickness],//8
    [insert_base_length/2 + insert_bar_length/2,insert_thickness + insert_buffer + insert_bar_height,tube_thickness],//9
    [insert_base_length/2 - insert_bar_length/2,insert_thickness + insert_buffer + insert_bar_height,tube_thickness],//10
    [0,insert_thickness + insert_buffer, tube_thickness],//11
];

*showPoints(insert_slot_upper_points);

insert_slot_upper_faces = [
    [0,1,2,3,4,5],
    [0,5,11,6],
    [5,4,10,11],
    [4,3,9,10],
    [3,2,8,9],
    [2,1,7,8],
    [1,0,6,7],
    [11,10,9,8,7,6]
];

translate([tube_width/2+tube_thickness-insert_base_length/2,tube_depth+angle_depth-(insert_bar_height+insert_thickness+insert_buffer)-insert_distance_from_tube_end,tube_length+tube_thickness])translate([insert_base_length,insert_bar_height + insert_thickness + insert_buffer,0])rotate([0,0,180])polyhedron(insert_slot_upper_points,insert_slot_upper_faces);

translate([tube_width/2+tube_thickness-insert_base_length/2,tube_depth+angle_depth-(insert_thickness+insert_buffer)-insert_distance_from_tube_end,0])cube([insert_base_length,insert_thickness+insert_buffer,tube_thickness]);

    translate([tube_thickness,0,tube_thickness])cube([tube_width, tube_depth + angle_depth, tube_length]);
    
    //Brushes for to get the spacing right
translate([-(plexi_cube_width/2-tube_width/2 + plexi_cube_buffer),-(plexi_cube_depth) ,-(plexi_cube_length/2-tube_length/2 + plexi_cube_buffer)])translate([0,plexi_cube_width+tube_depth/2,((plexi_cube_length+2*plexi_cube_thickness+2*plexi_cube_buffer)-brush_width)/2])translate([-brush_head_length,0,brush_width])rotate([30,90,0])brush();

translate([-(plexi_cube_width/2-tube_width/2 + plexi_cube_buffer),-(plexi_cube_depth) ,-(plexi_cube_length/2-tube_length/2 + plexi_cube_buffer)])translate([0,plexi_cube_width+tube_depth/2,((plexi_cube_length+2*plexi_cube_thickness+2*plexi_cube_buffer)-brush_width)/2])translate([+brush_head_length,0,brush_width])translate([plexi_cube_width+2*plexi_cube_thickness + 2*plexi_cube_buffer,0,-brush_width])rotate([0,180,0])rotate([30,90,0])brush();

    
if (grid_pattern == "squares") square_grid();
else if (grid_pattern == "squares2") square_grid2();   
}

//security_bar
translate([tube_thickness,tube_depth+angle_depth-insert_distance_from_tube_end,tube_thickness])translate([0,insert_distance_from_tube_end,0])rotate([0,0,270])triangle(insert_distance_from_tube_end,security_bar_width,tube_length);
translate([tube_width-tube_thickness,tube_depth+angle_depth-insert_distance_from_tube_end,tube_thickness])triangle(insert_distance_from_tube_end,security_bar_width,tube_length);


//slide bar
translate([-slide_bar_width,tube_depth+angle_depth-slide_bar_length,0])
color("red"){cube([slide_bar_width,slide_bar_length,slide_bar_height]); 
}
translate([tube_width+2*tube_thickness,tube_depth+angle_depth-slide_bar_length,0])
color("red"){cube([slide_bar_width,slide_bar_length,slide_bar_height]); 
}
}
}
}




// darkener
else if (cube_design == "darkener"){
darkener_top_width = plexi_cube_width+2*plexi_cube_thickness+2*plexi_cube_buffer;
darkener_top_depth = plexi_cube_depth_overall-plexi_cube_depth+plexi_cube_thickness;
darkener_top_length = plexi_cube_length+2*plexi_cube_thickness+2*plexi_cube_buffer;
darkener_bottom_width = plexi_cube_width+4*plexi_cube_thickness+4*plexi_cube_buffer;
darkener_bottom_depth = darkener_overhang+2*plexi_cube_thickness;
darkener_bottom_length = plexi_cube_length+4*plexi_cube_thickness+4*plexi_cube_buffer;

difference(){
cube([darkener_bottom_width,darkener_top_depth,darkener_bottom_length]);
translate([2*plexi_cube_thickness+2*plexi_cube_buffer,plexi_cube_thickness,2*plexi_cube_thickness+2*plexi_cube_buffer])cube([darkener_top_width-2*plexi_cube_thickness,darkener_top_depth-plexi_cube_thickness,darkener_top_length - 2*plexi_cube_thickness]);
}
    

translate([0,darkener_top_depth,0])difference(){
cube([darkener_bottom_width,darkener_bottom_depth,darkener_bottom_length]);
translate([plexi_cube_thickness+plexi_cube_buffer,0,plexi_cube_thickness+plexi_cube_buffer]) cube([plexi_cube_width+2*plexi_cube_thickness+3*plexi_cube_buffer,darkener_overhang+2*plexi_cube_thickness,plexi_cube_length+2*plexi_cube_thickness+3*plexi_cube_buffer]);

}
}

else if (cube_design == "funnel"){
    funnel_slide_length = tube_count * tube_depth - 8;
    translate([0,funnel_pyramid_length+funnel_slide_width,0])
    difference(){
    cube([funnel_slide_length, funnel_slide_width, funnel_slide_height]);
    translate([0,0,2])cube([funnel_slide_length,funnel_slide_width/2, funnel_slide_hollow_height]);
    cube([funnel_slide_length, funnel_slide_buffer_width,2]);
    }
    translate([0,funnel_slide_width,0])mirror([0,1,0])difference(){
    cube([funnel_slide_length, funnel_slide_width, funnel_slide_height]);
    translate([0,0,2])cube([funnel_slide_length,funnel_slide_width/2, funnel_slide_hollow_height]);
    cube([funnel_slide_length, funnel_slide_buffer_width,2]);
    }
    
    
    funnel_pyramid_points = [
    [funnel_slide_length, funnel_pyramid_length,0],
    [funnel_slide_length,0,0],
    [0,0,0],
    [0,funnel_pyramid_length,0],
    [funnel_slide_length/2,funnel_pyramid_length/2,funnel_pyramid_tip_height]];
    
    funnel_pyramid_faces = [
    [0,1,4],
    [1,2,4],
    [2,3,4],
    [3,0,4],
    [1,0,3],
    [2,1,3]];
    
    funnel_pyramid_points_hollow = [
    [funnel_slide_length, funnel_pyramid_length,-2],
    [funnel_slide_length,0,-2],
    [0,0,-2],
    [0,funnel_pyramid_length,-2],
    [funnel_slide_length/2,funnel_pyramid_length/2,funnel_pyramid_tip_height-1]];
    
    funnel_pyramid_faces_hollow = [
    [0,1,4],
    [1,2,4],
    [2,3,4],
    [3,0,4],
    [1,0,3],
    [2,1,3]];
    
    difference(){
    union(){translate([0,funnel_slide_width,funnel_slide_height-2])cube([funnel_slide_length,funnel_pyramid_length, 2]);
    translate([0,funnel_slide_width,funnel_slide_height])polyhedron(funnel_pyramid_points, funnel_pyramid_faces);
    translate([funnel_slide_length/2-funnel_tip_cube_length/2,(funnel_pyramid_length+2*funnel_slide_width)/2-funnel_tip_cube_width/2,funnel_pyramid_tip_height+funnel_slide_height-funnel_tip_cube_height-1])cube([funnel_tip_cube_width, funnel_tip_cube_length, funnel_tip_cube_height]);
    }
    union(){
    color("red")translate([0,funnel_slide_width,funnel_slide_height])polyhedron(funnel_pyramid_points_hollow, funnel_pyramid_faces_hollow);
    
    translate([funnel_slide_length/2,funnel_pyramid_length/2 + funnel_slide_width,10])color("turquoise")cylinder(h=funnel_hollow_cylinder_height, d=funnel_hollow_cylinder_diameter);
    }
}
}
